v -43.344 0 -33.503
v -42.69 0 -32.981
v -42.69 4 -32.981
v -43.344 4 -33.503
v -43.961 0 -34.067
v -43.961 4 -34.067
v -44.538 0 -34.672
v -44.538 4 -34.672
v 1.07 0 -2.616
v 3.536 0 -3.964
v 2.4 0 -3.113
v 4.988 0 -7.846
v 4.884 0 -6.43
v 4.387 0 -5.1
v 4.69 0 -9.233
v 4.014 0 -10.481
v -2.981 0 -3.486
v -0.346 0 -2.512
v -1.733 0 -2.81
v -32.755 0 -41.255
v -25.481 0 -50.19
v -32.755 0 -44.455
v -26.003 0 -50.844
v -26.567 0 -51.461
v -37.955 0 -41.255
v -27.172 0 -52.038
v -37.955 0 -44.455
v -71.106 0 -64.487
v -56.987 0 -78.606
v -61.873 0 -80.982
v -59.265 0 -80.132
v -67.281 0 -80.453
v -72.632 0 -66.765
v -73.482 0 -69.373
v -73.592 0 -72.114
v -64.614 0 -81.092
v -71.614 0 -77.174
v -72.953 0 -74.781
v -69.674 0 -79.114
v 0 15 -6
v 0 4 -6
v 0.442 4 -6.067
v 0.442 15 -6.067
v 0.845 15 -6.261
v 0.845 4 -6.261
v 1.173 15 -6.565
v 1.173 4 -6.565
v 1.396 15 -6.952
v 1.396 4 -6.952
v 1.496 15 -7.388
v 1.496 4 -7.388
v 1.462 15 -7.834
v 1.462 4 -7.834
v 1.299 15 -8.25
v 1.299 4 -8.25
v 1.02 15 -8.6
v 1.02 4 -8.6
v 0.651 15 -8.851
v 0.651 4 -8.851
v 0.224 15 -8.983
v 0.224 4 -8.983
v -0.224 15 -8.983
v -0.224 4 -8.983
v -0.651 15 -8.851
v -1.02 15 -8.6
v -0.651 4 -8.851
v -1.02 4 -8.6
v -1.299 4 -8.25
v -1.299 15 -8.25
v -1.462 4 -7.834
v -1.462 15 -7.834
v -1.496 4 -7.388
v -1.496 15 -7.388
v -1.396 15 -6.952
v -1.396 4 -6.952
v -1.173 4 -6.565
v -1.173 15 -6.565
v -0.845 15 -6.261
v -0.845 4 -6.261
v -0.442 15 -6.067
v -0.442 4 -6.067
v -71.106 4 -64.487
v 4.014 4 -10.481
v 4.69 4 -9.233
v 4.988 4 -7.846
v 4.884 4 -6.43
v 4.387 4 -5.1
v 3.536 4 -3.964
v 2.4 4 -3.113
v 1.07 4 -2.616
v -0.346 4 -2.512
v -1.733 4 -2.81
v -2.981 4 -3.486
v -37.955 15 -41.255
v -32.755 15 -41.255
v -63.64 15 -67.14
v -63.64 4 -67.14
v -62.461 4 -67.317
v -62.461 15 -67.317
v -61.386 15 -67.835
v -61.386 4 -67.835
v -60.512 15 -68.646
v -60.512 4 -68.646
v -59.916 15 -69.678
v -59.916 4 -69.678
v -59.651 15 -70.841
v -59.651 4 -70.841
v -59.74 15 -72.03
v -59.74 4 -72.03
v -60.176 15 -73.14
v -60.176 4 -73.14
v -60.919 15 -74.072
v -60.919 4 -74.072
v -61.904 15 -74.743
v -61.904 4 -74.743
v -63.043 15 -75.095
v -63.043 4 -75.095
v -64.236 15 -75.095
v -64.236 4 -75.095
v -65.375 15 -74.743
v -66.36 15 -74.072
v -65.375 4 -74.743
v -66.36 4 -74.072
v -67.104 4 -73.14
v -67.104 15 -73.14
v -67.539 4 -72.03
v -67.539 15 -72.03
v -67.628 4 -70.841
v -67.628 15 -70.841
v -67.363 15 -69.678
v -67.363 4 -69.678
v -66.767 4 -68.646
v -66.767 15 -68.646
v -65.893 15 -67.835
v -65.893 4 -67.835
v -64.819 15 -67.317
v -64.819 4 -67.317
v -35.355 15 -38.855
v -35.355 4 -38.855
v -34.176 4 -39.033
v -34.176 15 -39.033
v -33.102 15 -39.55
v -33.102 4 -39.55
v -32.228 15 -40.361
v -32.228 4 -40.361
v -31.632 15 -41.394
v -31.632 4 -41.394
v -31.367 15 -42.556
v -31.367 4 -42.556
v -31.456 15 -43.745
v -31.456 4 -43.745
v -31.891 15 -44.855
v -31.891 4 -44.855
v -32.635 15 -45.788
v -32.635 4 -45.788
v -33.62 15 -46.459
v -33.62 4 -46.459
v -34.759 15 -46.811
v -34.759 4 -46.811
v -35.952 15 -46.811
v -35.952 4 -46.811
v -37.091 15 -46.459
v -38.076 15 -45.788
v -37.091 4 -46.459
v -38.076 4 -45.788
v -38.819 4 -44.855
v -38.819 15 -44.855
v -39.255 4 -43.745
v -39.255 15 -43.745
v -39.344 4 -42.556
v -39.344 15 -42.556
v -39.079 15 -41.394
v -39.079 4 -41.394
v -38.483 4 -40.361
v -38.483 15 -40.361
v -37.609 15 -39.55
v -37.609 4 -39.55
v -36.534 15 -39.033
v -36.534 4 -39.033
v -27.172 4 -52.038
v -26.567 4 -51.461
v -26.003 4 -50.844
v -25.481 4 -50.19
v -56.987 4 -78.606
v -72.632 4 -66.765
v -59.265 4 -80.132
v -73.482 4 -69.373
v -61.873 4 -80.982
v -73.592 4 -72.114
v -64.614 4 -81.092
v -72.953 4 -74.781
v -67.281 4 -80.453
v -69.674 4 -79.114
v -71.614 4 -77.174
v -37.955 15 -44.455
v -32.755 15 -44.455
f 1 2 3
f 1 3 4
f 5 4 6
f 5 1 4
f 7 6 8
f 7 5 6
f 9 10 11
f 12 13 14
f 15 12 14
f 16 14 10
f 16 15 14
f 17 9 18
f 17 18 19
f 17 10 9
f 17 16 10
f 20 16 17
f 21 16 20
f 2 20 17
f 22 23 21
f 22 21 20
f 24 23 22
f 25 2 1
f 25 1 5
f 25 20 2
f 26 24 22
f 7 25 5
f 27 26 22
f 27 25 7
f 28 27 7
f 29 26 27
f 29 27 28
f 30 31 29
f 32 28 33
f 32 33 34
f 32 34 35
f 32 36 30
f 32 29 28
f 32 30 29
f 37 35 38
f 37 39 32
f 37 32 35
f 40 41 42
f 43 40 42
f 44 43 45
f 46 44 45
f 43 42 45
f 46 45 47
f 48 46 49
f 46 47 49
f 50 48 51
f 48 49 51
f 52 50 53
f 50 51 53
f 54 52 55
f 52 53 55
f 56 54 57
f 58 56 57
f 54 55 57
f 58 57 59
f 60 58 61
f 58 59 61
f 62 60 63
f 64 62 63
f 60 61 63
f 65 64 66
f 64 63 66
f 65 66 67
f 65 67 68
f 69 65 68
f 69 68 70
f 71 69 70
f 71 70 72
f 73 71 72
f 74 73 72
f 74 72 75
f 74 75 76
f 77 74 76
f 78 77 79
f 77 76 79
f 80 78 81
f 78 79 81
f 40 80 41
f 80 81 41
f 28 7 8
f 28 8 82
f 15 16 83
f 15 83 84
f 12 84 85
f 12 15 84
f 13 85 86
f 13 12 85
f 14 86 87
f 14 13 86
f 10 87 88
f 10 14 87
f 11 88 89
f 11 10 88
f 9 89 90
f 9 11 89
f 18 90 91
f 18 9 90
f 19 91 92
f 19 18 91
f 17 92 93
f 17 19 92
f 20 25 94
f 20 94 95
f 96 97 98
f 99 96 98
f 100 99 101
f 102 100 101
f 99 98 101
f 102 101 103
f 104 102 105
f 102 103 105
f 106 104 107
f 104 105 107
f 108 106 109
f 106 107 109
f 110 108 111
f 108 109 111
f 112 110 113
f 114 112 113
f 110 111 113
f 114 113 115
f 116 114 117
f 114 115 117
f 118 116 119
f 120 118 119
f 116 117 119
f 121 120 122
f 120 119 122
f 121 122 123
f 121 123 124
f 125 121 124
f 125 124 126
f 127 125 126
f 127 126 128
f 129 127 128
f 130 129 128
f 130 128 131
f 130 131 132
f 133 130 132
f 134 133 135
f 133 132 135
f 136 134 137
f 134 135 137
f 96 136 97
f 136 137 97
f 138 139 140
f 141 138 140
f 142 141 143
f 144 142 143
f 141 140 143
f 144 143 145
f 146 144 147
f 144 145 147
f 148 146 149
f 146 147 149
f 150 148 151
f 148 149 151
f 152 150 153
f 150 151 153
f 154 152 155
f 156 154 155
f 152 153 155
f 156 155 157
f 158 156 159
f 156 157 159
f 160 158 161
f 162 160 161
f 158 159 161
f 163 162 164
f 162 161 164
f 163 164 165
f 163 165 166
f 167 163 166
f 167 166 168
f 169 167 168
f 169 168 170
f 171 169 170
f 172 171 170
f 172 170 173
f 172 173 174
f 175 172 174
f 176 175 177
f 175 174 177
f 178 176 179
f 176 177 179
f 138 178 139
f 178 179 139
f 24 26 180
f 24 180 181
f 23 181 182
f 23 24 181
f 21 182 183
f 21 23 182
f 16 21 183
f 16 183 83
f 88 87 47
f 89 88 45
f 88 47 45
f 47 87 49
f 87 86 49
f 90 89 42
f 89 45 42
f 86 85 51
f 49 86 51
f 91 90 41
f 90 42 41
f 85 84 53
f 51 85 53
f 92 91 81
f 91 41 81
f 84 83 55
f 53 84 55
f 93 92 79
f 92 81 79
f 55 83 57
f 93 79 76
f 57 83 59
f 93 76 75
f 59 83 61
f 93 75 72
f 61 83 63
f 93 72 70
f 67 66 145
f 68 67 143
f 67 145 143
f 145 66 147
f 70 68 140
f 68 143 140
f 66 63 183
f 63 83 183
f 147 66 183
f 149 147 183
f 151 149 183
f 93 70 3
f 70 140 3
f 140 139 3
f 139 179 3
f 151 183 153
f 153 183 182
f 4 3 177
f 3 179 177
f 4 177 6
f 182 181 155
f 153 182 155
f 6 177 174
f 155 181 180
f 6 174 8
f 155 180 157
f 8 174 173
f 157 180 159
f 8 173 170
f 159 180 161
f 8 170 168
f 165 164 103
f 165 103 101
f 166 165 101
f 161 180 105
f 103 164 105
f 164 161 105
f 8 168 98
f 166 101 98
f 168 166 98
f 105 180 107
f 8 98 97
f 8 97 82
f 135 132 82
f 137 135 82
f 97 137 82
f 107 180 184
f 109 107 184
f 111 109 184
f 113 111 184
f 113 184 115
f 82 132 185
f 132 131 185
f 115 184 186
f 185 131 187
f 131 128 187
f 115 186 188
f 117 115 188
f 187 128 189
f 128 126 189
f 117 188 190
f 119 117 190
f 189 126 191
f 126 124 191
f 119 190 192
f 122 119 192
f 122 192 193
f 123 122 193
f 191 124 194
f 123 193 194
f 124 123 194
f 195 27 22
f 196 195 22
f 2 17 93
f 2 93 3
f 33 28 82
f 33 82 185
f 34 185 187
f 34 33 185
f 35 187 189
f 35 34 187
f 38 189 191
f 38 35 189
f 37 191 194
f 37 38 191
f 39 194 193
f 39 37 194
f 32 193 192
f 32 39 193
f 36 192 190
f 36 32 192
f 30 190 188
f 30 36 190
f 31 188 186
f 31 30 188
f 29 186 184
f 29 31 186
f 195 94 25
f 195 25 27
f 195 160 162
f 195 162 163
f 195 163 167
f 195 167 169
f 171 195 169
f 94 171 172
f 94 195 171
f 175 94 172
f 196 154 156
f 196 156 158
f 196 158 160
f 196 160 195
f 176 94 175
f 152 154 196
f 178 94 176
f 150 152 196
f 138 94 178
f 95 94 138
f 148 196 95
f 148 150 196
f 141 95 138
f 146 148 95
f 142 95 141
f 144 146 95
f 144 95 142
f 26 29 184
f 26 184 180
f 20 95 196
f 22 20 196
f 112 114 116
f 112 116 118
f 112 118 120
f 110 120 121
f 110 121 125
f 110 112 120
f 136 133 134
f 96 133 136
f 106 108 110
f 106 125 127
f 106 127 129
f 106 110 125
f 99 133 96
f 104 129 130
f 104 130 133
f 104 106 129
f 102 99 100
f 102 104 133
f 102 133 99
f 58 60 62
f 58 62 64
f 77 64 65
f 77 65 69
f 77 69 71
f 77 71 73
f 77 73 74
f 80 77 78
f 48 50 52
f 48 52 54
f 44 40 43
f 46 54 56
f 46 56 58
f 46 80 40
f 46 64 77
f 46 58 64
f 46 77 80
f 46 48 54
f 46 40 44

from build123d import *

# Parameters (mm, degrees)
BOSS_EXTRUDE1_DEPTH = 4
BOSS_EXTRUDE2_START = 4
SKETCH1_5_R         = 1.5
SKETCH1_5_R_2       = 4
BOSS_EXTRUDE2_DEPTH = 11
SKETCH4_W           = 5.2
SKETCH4_H           = 3.2
CUT_EXTRUDE1_DEPTH  = 111.595789101


with BuildPart() as part:
    # Sketch1 → Boss-Extrude1 (new body)
    with BuildSketch(Plane(origin=(0, 0, 0), x_dir=(1, 0, 0), z_dir=(0, 1, 0))):
        with BuildLine():
            ThreePointArc((-44.538463923, 34.672416737), (-43.657271509, 33.779661806), (-42.68973376, 32.981299644))
            Line((-42.68973376, 32.981299644), (-2.98146126, 3.486162839))
            ThreePointArc((-2.98146126, 3.486162839), (3.535533906, 3.964466094), (4.013837161, 10.48146126))
            Line((4.013837161, 10.48146126), (-25.481299644, 50.18973376))
            ThreePointArc((-25.481299644, 50.18973376), (-26.279661806, 51.157271509), (-27.172416737, 52.038463923))
            Line((-27.172416737, 52.038463923), (-56.986827931, 78.605565481))
            ThreePointArc((-56.986827931, 78.605565481), (-70.710678119, 78.210678119), (-71.105565481, 64.486827931))
            Line((-71.105565481, 64.486827931), (-44.538463923, 34.672416737))
        make_face()
    extrude(amount=BOSS_EXTRUDE1_DEPTH)

    # Sketch1<5> → Boss-Extrude2 (add)
    with BuildSketch(Plane(origin=(0, 0, 0), x_dir=(1, 0, 0), z_dir=(0, 1, 0)).offset(BOSS_EXTRUDE2_START)):
        with Locations((0, 7.5)):
            Circle(SKETCH1_5_R)
        with Locations((-35.355339059, 42.855339059)):
            Circle(SKETCH1_5_R_2)
        with Locations((-63.639610307, 71.139610307)):
            Circle(SKETCH1_5_R_2)
    extrude(amount=BOSS_EXTRUDE2_DEPTH)

    # Sketch4 → Cut-Extrude1 (cut, through all)
    with BuildSketch(Plane(origin=(0, 15, 0), x_dir=(1, 0, 0), z_dir=(0, 1, 0))):
        with Locations((-35.355339059, 42.855339059)):
            Rectangle(SKETCH4_W, SKETCH4_H)
    extrude(amount=-CUT_EXTRUDE1_DEPTH, mode=Mode.SUBTRACT)


solid = part.part
